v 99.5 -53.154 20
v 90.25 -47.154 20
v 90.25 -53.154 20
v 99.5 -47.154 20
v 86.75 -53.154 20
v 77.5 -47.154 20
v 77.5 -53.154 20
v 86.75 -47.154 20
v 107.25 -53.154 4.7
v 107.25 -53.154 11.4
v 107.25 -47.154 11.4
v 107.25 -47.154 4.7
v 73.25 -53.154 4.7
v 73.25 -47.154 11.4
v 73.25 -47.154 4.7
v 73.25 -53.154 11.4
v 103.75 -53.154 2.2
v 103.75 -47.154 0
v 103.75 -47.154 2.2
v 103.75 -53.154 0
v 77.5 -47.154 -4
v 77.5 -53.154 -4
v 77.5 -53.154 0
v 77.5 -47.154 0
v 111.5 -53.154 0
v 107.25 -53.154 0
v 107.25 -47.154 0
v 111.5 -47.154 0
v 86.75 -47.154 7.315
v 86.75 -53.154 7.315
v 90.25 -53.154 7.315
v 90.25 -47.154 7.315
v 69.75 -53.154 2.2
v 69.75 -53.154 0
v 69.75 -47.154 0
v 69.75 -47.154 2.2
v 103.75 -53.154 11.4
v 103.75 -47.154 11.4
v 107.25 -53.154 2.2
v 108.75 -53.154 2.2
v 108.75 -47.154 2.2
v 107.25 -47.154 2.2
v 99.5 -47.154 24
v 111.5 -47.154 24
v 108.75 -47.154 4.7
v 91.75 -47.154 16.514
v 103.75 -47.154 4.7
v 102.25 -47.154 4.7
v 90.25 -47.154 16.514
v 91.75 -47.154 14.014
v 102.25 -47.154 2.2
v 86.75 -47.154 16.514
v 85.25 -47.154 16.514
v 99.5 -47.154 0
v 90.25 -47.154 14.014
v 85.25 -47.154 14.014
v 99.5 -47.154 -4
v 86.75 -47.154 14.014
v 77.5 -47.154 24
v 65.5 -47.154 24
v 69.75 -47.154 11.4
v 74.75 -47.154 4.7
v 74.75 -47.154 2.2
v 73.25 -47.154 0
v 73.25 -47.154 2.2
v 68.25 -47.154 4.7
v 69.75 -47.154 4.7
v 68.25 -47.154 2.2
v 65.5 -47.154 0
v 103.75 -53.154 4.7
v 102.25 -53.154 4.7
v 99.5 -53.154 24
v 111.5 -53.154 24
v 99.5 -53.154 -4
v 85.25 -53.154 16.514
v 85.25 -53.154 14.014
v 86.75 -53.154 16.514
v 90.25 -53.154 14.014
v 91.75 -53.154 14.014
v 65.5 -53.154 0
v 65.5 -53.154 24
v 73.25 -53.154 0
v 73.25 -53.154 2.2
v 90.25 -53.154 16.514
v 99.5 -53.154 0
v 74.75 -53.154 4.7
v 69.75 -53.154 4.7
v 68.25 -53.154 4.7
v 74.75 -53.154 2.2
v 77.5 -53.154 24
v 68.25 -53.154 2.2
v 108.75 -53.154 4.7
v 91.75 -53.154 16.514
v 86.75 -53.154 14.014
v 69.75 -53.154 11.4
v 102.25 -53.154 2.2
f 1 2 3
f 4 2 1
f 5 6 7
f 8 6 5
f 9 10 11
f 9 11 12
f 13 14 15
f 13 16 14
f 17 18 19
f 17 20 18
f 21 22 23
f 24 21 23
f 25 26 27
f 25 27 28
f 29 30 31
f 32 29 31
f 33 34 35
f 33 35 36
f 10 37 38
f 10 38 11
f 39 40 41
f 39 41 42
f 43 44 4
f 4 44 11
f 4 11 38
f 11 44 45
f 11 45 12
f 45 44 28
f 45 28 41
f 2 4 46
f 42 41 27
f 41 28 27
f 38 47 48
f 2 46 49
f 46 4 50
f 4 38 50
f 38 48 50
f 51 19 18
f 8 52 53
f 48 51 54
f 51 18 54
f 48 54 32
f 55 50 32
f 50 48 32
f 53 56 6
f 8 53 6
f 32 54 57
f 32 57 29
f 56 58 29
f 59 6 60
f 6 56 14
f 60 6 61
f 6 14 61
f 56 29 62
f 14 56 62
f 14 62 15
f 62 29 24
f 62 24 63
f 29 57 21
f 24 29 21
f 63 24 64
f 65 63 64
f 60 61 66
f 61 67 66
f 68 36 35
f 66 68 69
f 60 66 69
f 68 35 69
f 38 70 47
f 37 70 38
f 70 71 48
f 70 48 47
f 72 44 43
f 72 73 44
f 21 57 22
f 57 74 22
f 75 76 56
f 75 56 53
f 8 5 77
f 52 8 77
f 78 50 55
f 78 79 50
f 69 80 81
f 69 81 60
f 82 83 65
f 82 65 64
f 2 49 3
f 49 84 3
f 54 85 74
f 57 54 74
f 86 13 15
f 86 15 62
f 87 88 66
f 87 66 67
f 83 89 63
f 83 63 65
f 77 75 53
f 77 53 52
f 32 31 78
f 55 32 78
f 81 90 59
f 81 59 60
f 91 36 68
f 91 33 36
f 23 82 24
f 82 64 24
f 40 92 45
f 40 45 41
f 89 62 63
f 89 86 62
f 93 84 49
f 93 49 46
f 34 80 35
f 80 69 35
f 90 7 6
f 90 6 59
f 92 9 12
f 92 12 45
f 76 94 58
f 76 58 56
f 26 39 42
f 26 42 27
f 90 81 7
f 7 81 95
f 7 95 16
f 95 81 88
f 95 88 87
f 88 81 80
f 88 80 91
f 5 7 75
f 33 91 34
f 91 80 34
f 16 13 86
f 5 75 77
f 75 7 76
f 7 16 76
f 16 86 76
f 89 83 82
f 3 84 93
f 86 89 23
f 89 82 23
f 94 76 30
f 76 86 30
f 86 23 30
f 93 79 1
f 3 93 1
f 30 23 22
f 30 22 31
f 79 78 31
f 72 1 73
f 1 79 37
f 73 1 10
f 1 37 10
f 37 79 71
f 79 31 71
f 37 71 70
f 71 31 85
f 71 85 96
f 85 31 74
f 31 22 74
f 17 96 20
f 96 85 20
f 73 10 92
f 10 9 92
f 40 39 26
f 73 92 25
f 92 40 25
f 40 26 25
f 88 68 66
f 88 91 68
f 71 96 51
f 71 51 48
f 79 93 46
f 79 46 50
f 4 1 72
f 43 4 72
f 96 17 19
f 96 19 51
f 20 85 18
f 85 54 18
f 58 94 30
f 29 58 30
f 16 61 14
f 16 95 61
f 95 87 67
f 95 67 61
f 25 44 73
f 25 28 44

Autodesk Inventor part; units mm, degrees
ref_plane "YZ Plane" through (0, 0, 0) normal (1, 0, 0) x (0, 1, 0)
ref_plane "XZ Plane" through (0, 0, 0) normal (0, 1, 0) x (-1, 0, 0)
ref_plane "РабПлоскость1" through (0, 0, 0) normal (0, 0, 1) x (1, 0, 0)
sketch "Эскиз1" plane through (0, 0, 0) normal (0, 0, 1) x (1, 0, 0)
  line L0 (111.5, 97.5) -> (111.5, -97.5) projected
  line L1 (65.5, 97.5) -> (111.5, 97.5) projected
  line L2 (65.5, 63.1836) -> (65.5, 97.5) projected
  line L3 (65.5, 63.1836) -> (57.5, 63.1836) projected
  line L4 (57.5, 53.1836) -> (57.5, 63.1836) projected
  line L5 (65.5, 53.1836) -> (57.5, 53.1836) projected
  line L6 (65.5, -53.1539) -> (65.5, 53.1836) projected
  line L7 (65.5, -53.1539) -> (57.5, -53.1539) projected
  line L8 (57.5, -63.1539) -> (57.5, -53.1539) projected
  line L9 (65.5, -63.1539) -> (57.5, -63.1539) projected
  line L10 (65.5, -97.5) -> (65.5, -63.1539) projected
  line L11 (111.5, -97.5) -> (65.5, -97.5) projected
  line L12 (65.5, 53.1836) -> (111.5, 53.1836)
  line L13 (111.5, 53.1836) -> (111.5, 47.1836)
  line L14 (111.5, 47.1836) -> (65.5, 47.1836)
  line L15 (65.5, 47.1836) -> (65.5, 53.1836)
  line L16 (65.5, -53.1539) -> (111.5, -53.1539)
  line L17 (111.5, -53.1539) -> (111.5, -47.1539)
  line L18 (111.5, -47.1539) -> (65.5, -47.1539)
  line L19 (65.5, -47.1539) -> (65.5, -53.1539)
  point P0 (0, 0)
  dimension "d0" = 6
  dimension "d1" = 6
ref_plane "РабПлоскость2" through (57.5, -97.5, 20) normal (0, 0, -1) x (0, 1, 0)
extrude "Выдавливание1" add sketch "Эскиз1" along normal up to surface (20 mm away) contours L0 L16 L6 L18
sketch "Эскиз2" plane through (65.5, -53.1539, 0) normal (0, -1, 0) x (1, 0, 0)
  line L0 (46, 24) -> (0, 24) projected
  line L1 (0, 20) -> (46, 20) projected
  line L2 (0, 20) -> (12, 20)
  line L3 (12, 20) -> (12, 24)
  line L4 (12, 24) -> (0, 24)
  line L5 (0, 24) -> (0, 20)
  line L6 (46, 20) -> (34, 20)
  line L7 (34, 20) -> (34, 24)
  line L8 (34, 24) -> (46, 24)
  line L9 (46, 24) -> (46, 20)
  point P0 (-65.5, 0)
  point P1 (34, 20)
  dimension "d4" = 12
  dimension "d5" = 12
sketch "Эскиз3" plane through (65.5, -53.1539, 0) normal (0, -1, 0) x (1, 0, 0)
  line L0 (31, 10.1574) -> (31, 5.1574)
  line L1 (26.25, 14.0145) -> (19.75, 14.0145)
  line L2 (19.75, 14.0145) -> (19.75, 16.5145)
  line L3 (19.75, 16.5145) -> (26.25, 16.5145)
  line L4 (26.25, 16.5145) -> (26.25, 14.0145)
  line L5 (24.75, 20) -> (21.25, 20)
  line L6 (21.25, 20) -> (21.25, 7.3147)
  line L7 (21.25, 7.3147) -> (24.75, 7.3147)
  line L8 (24.75, 7.3147) -> (24.75, 20)
  line L9 (24.75, 20) -> (21.25, 7.3147) construction
  line L10 (21.25, 20) -> (24.75, 7.3147) construction
  line L11 (24.75, 20) -> (21.25, 16.5145)
  line L12 (24.75, 16.5145) -> (21.25, 20)
  line L13 (46, 20) -> (0, 20) projected
  point P0 (-65.5, 0)
  point P1 (23, 13.6574)
  point P2 (23, 20)
  point P3 (21.25, 14.0145)
  point P4 (24.75, 14.0145)
  dimension "d6" = 6.5
  dimension "d7" = 2.5
  dimension "d10" = 4.75
  dimension "d12" = 3.5
  dimension "d13" = 3.25
extrude "Выдавливание2" add sketch "Эскиз2" against normal blind 6 contours L9 L1 L7 L0 | L3 L1 L5 L0
extrude "Выдавливание3" cut sketch "Эскиз3" against normal blind 6
sketch "Эскиз4" plane through (65.5, -53.1539, 0) normal (0, -1, 0) x (1, 0, 0)
  line L0 (46, 0) -> (0, 0) projected
  line L1 (12, 0) -> (34, 0)
  line L2 (34, 0) -> (34, -4)
  line L3 (34, -4) -> (12, -4)
  line L4 (12, -4) -> (12, 0)
  point P0 (-65.5, 0)
  point P1 (34, 0)
  dimension "d18" = 12
  dimension "d19" = 12
  dimension "d20" = 4
extrude "Выдавливание4" add sketch "Эскиз4" against normal blind 6
sketch "Эскиз5" plane through (65.5, -53.1539, 24) normal (0, -1, 0) x (1, 0, 0)
  line L0 (9.25, -21.8) -> (2.75, -21.8)
  line L1 (2.75, -21.8) -> (2.75, -19.3)
  line L2 (2.75, -19.3) -> (9.25, -19.3)
  line L3 (9.25, -19.3) -> (9.25, -21.8)
  line L4 (4.25, -12.6005) -> (7.75, -12.6005)
  line L5 (7.75, -12.6005) -> (7.75, -24)
  line L6 (7.75, -24) -> (4.25, -24)
  line L7 (4.25, -24) -> (4.25, -12.6005)
  line L8 (4.25, -12.6005) -> (7.75, -24) construction
  line L9 (7.75, -12.6005) -> (4.25, -24) construction
  line L10 (0, -24) -> (12, -24) projected
  line L11 (43.25, -19.3) -> (43.25, -21.8)
  line L12 (41.75, -24) -> (38.25, -24)
  line L13 (41.75, -12.6) -> (41.75, -24)
  line L14 (43.25, -21.8) -> (36.75, -21.8)
  line L15 (36.75, -19.3) -> (43.25, -19.3)
  line L16 (38.25, -12.6) -> (41.75, -24) construction
  line L17 (38.25, -12.6) -> (41.75, -12.6)
  line L18 (41.75, -12.6) -> (38.25, -24) construction
  line L19 (36.75, -21.8) -> (36.75, -19.3)
  line L20 (38.25, -24) -> (38.25, -12.6)
  line L21 (34, -24) -> (46, -24) projected
  point P0 (-65.5, -24)
  point P1 (6, -18.3002)
  point P2 (6, -24)
  point P3 (40, -18.3)
  point P4 (42.6795, -22.1366)
  point P5 (40, -24)
  point P6 (38.25, -19.3)
  point P7 (38.25, -21.8)
  point P8 (41.75, -21.8)
  point P9 (41.75, -19.3)
  point P10 (4.25, -19.3)
  point P11 (4.25, -21.8)
  point P12 (7.75, -21.8)
  point P13 (7.75, -19.3)
  dimension "d23" = 6.5
  dimension "d24" = 2.5
  dimension "d29" = 3.5
  dimension "d30" = 3.25
  dimension "d31" = 2.2
  dimension "d32" = 6.5
  dimension "d33" = 2.5
  dimension "d34" = 3.5
  dimension "d35" = 3.25
  dimension "d36" = 2.2
  dimension "d39" = 6.7
extrude "Выдавливание5" cut sketch "Эскиз5" against normal blind 6
properties part number "стенка держит стенку"
